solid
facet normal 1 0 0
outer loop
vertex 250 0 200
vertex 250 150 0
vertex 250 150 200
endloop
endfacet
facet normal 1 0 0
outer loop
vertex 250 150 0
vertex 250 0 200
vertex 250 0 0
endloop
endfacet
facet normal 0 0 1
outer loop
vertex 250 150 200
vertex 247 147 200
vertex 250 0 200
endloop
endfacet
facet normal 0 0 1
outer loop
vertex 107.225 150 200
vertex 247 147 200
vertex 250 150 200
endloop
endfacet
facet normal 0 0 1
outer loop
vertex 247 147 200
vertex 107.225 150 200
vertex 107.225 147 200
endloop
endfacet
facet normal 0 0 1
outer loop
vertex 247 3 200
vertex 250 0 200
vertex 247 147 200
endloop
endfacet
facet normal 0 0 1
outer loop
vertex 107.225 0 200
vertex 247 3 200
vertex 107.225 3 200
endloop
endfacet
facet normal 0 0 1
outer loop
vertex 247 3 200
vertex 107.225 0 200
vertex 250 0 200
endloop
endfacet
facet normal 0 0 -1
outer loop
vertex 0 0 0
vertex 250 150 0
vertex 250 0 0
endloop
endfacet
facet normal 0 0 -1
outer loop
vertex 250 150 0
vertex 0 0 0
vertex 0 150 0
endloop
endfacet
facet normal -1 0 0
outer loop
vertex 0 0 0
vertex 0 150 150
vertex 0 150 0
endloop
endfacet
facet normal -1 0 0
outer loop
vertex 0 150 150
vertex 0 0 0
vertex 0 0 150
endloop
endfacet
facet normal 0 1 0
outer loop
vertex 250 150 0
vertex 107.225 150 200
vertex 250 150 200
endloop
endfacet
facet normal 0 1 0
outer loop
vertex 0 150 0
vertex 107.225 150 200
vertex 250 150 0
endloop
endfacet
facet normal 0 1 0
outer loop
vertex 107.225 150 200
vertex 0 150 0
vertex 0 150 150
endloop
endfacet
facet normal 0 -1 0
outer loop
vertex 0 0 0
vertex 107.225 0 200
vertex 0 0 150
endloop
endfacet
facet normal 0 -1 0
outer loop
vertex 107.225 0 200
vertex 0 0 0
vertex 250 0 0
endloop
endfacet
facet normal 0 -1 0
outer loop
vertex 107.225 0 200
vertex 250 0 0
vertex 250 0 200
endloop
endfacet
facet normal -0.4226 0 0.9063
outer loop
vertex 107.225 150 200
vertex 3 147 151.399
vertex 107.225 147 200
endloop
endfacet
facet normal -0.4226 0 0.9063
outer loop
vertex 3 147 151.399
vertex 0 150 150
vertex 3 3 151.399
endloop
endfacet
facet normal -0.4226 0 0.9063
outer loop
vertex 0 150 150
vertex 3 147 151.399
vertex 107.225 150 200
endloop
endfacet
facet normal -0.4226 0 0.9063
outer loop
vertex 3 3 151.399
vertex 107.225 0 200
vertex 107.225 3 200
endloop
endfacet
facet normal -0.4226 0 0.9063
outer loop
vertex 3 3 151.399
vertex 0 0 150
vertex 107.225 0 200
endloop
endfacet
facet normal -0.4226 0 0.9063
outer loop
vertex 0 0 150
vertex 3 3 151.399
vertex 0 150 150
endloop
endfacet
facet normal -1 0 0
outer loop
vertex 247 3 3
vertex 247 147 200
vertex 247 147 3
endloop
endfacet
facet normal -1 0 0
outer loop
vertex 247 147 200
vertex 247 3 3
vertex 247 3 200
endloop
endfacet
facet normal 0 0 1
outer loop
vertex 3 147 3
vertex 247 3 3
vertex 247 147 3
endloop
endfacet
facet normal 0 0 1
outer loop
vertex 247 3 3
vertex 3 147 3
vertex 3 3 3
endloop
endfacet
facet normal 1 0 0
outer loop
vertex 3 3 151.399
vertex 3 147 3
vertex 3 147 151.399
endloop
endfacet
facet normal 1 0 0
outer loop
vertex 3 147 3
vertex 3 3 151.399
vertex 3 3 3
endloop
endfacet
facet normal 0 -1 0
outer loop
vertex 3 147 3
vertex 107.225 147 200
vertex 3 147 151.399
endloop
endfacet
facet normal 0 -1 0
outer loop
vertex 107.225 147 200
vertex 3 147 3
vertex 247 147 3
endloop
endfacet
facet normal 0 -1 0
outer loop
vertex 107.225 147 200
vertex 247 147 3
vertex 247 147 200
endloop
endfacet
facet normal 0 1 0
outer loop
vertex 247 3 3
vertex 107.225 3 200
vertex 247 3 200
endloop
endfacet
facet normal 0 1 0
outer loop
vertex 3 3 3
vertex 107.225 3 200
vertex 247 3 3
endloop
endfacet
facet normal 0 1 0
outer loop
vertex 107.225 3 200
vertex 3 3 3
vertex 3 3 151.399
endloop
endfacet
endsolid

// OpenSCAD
difference() {
    cube([250,150,200]);
    translate([0,-50,150]) rotate([0,-25,0]) cube([500,250,200]);
    translate([3,3,3]) cube([250-6,150-6,250]);
}
